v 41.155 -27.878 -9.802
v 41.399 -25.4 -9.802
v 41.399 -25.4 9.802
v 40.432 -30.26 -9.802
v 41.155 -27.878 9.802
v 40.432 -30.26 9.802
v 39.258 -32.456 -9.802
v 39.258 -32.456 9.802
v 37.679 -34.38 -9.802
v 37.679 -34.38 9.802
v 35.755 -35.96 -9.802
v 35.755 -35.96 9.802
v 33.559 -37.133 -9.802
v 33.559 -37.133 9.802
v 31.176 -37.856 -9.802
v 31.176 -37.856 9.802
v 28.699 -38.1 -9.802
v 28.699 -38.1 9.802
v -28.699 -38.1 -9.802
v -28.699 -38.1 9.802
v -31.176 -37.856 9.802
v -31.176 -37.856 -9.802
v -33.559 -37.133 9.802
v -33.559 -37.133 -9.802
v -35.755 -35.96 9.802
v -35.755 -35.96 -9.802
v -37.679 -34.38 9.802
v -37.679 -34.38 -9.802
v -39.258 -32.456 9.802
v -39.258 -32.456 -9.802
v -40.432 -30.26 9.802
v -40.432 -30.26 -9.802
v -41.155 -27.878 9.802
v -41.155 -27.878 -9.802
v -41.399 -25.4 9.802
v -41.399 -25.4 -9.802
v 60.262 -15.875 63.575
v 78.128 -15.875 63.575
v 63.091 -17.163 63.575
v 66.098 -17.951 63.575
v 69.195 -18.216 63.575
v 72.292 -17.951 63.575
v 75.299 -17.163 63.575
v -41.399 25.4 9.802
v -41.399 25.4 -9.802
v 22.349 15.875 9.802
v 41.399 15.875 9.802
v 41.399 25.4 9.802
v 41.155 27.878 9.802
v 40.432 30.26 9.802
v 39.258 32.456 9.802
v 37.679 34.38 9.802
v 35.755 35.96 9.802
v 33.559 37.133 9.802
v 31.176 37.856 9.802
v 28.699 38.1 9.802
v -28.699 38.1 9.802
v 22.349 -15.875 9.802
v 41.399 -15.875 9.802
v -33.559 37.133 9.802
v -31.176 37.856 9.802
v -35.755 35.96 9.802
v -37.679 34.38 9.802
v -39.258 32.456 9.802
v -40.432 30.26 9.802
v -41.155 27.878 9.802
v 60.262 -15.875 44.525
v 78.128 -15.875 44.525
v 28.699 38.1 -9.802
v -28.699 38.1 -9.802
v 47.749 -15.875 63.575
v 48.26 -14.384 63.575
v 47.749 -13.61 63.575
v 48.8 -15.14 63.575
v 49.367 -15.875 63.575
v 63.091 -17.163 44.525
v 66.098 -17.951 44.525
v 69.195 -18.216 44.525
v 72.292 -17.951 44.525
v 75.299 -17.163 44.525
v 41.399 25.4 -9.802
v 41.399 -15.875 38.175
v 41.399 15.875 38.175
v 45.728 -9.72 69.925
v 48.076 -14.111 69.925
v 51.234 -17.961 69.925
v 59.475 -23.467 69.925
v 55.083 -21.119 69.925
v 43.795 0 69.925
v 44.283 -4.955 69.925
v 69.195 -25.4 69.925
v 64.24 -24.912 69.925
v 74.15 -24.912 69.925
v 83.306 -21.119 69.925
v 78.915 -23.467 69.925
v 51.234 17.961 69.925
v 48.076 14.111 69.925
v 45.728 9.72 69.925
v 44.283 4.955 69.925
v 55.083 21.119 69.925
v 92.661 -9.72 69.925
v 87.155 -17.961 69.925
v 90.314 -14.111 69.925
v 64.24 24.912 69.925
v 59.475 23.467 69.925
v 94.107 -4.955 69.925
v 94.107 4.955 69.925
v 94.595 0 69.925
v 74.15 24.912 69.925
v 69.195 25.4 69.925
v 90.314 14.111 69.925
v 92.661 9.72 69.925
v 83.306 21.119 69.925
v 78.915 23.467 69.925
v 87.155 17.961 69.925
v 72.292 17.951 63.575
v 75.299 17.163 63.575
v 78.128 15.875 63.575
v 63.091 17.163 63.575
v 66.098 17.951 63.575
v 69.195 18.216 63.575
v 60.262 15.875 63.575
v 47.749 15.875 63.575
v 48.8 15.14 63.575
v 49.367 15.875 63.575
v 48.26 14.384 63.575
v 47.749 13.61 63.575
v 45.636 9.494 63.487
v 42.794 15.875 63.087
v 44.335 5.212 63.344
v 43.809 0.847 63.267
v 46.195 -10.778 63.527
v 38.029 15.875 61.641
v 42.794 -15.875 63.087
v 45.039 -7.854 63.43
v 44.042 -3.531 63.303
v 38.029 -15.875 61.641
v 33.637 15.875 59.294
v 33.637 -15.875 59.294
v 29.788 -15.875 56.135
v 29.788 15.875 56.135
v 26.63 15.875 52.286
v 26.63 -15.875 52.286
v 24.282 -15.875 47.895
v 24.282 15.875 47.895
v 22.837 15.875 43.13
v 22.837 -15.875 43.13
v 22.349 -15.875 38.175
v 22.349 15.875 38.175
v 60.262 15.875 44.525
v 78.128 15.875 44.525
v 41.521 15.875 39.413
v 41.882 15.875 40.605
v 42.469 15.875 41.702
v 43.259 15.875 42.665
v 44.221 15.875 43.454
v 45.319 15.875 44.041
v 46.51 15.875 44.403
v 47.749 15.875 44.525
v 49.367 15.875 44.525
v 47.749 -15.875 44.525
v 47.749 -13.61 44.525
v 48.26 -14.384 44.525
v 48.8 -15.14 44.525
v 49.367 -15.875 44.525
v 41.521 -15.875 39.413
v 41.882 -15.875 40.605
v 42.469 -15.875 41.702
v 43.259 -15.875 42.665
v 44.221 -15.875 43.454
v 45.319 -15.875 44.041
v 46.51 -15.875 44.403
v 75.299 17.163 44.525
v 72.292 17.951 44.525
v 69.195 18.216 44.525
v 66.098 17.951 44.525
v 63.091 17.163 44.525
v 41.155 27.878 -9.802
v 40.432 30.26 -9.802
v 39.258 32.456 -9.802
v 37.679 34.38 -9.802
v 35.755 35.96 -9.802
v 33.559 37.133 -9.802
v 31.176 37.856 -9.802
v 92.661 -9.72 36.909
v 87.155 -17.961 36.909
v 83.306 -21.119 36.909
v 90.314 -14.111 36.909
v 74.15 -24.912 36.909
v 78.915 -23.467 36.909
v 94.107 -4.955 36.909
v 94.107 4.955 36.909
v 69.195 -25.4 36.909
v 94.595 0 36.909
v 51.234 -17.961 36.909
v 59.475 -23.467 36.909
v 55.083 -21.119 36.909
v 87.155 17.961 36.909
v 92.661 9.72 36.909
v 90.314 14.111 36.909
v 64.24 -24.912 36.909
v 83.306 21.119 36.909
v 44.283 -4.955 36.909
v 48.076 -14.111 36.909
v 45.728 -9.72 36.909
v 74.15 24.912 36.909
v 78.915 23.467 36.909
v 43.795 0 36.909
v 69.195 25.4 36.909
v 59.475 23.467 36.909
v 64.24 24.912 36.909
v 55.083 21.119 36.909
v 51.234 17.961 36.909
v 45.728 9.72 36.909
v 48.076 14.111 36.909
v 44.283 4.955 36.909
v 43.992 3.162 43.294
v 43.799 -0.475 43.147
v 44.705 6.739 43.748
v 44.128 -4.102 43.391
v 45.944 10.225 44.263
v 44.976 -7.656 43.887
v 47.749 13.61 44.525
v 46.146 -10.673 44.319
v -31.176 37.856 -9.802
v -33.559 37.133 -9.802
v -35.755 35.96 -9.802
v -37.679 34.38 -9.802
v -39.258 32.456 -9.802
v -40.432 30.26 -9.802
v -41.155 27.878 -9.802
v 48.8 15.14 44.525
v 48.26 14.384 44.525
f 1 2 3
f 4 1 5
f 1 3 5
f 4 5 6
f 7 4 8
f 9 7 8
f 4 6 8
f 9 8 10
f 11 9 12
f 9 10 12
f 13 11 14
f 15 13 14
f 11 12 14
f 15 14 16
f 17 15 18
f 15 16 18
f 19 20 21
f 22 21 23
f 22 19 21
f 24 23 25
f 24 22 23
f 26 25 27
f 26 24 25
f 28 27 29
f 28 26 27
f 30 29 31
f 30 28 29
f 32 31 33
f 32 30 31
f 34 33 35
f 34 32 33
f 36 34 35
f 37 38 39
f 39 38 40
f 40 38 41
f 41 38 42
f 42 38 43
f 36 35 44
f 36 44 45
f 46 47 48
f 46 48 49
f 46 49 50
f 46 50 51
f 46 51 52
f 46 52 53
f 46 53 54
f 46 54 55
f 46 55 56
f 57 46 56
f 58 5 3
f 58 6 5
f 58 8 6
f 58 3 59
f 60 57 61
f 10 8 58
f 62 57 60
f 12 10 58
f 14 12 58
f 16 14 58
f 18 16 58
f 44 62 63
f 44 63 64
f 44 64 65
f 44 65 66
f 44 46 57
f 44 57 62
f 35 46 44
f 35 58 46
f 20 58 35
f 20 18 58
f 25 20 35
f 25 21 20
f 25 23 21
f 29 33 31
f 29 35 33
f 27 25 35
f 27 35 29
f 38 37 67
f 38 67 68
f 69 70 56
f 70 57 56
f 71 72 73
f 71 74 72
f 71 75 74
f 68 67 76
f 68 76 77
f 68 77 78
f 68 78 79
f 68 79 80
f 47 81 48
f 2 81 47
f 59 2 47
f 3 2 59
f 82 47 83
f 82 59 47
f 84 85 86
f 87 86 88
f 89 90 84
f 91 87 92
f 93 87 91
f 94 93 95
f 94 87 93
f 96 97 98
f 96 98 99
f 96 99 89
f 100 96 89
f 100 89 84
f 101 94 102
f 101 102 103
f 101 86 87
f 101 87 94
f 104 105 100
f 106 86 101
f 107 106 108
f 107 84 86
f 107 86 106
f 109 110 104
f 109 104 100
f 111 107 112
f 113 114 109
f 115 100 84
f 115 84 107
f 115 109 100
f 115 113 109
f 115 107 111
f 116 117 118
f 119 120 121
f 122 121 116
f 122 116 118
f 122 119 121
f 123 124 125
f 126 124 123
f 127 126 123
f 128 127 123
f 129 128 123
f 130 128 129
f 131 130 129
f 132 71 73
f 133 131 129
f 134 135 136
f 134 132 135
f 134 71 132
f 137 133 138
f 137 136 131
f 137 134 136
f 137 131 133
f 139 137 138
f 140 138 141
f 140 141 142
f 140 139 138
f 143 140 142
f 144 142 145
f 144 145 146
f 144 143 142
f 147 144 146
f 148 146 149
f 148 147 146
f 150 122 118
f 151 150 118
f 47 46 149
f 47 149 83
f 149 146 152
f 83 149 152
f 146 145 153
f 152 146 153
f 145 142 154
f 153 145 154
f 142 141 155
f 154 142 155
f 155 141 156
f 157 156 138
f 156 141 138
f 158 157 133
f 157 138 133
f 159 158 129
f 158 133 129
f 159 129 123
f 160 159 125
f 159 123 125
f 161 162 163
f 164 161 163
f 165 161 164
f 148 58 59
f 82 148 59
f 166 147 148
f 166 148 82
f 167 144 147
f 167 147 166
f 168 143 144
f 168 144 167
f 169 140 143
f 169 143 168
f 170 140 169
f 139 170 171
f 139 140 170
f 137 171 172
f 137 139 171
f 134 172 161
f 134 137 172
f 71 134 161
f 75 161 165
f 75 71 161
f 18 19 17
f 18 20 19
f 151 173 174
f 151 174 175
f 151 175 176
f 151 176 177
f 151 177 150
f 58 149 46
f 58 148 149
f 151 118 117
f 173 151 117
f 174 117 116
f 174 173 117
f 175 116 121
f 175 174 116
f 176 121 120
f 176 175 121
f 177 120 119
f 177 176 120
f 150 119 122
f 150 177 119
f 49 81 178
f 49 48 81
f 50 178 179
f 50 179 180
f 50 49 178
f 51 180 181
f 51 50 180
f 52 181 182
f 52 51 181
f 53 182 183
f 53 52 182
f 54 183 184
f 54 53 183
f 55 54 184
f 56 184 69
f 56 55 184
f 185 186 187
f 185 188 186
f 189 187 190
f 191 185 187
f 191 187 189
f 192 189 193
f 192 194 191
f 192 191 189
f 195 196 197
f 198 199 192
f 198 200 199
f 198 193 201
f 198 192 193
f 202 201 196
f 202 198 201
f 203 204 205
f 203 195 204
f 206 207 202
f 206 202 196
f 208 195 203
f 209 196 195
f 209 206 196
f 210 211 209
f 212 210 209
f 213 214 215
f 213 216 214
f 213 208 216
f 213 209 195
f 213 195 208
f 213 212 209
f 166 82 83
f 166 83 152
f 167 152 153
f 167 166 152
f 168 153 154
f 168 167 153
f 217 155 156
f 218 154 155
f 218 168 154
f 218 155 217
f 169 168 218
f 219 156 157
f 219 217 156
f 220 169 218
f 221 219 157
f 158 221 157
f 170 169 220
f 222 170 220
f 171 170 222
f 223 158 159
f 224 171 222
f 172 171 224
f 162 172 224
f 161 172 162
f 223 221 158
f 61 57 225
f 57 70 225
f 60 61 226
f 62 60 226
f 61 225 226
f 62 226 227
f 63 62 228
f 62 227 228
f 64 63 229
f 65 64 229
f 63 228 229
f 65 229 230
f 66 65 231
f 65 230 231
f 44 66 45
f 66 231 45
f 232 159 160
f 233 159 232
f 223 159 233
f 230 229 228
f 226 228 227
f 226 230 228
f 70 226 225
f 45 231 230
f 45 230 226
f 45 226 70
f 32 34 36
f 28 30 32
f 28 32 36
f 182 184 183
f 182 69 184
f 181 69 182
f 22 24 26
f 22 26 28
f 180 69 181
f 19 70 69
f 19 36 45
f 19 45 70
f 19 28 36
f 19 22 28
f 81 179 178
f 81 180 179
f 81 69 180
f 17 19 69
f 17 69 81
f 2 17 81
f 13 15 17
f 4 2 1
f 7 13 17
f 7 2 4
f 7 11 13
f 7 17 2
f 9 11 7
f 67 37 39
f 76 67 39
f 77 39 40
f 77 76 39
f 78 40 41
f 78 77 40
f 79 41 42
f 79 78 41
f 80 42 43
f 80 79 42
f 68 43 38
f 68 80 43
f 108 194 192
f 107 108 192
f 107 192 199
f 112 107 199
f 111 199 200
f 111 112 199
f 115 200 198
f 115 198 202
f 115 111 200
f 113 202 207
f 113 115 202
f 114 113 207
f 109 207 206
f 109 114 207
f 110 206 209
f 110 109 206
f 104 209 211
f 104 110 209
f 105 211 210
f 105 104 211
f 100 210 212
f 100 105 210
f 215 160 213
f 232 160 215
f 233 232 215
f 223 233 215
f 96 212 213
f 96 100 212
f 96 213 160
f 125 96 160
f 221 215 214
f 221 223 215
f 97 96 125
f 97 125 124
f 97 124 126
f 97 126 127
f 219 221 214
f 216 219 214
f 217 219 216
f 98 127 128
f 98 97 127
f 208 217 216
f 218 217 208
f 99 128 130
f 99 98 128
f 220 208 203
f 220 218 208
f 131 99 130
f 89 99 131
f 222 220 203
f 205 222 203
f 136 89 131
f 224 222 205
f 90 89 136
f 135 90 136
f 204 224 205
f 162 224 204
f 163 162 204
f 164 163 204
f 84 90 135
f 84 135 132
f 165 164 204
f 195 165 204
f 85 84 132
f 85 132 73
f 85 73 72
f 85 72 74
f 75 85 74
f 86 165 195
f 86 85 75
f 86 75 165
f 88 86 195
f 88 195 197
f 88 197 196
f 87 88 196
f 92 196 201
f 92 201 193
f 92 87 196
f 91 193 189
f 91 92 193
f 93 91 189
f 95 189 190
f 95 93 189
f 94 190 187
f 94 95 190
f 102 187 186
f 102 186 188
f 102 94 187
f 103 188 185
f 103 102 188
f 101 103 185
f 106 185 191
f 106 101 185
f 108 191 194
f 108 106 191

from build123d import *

# Parameters (mm, degrees)
F1_DEPTH = 38.1
F0_W     = 18.215902
F0_H     = 19.05
F2_DEPTH = 15.875
F4_R     = 12.7


with BuildPart() as f1:
    # F0 (on Front) → F1 (new body, symmetric)
    with BuildSketch(Plane.XZ):
        Polygon((-41.398831, -9.801595), (41.398831, -9.801595), (41.398831, 9.801595), (22.34883, 9.801595), (-41.398831, 9.801595), align=None)
    extrude(amount=F1_DEPTH, both=True)

    # F0 (on Front) → F2 (join, symmetric)
    with BuildSketch(Plane.XZ):
        with BuildLine():
            Line((22.34883, 9.801595), (41.398831, 9.801595))
            Line((41.398831, 9.801595), (41.398831, 38.174614))
            ThreePointArc((41.398831, 38.174614), (43.258703, 42.664742), (47.74883, 44.524614))
            Line((47.74883, 44.524614), (69.194875, 44.524614))
            Line((69.194875, 44.524614), (69.194875, 63.574614))
            Line((69.194875, 63.574614), (47.74883, 63.574614))
            ThreePointArc((47.74883, 63.574614), (29.788318, 56.135127), (22.34883, 38.174614))
            Line((22.34883, 38.174614), (22.34883, 9.801595))
        make_face()
        with Locations((78.302826, 54.049614)):
            Rectangle(F0_W, F0_H)
    extrude(amount=F2_DEPTH, both=True)

    # F0 (on Front) → F3 (revolve)
    with BuildSketch(Plane.XZ):
        Polygon((87.410777, 44.524614), (69.194875, 44.524614), (69.194875, 36.908722), (94.594875, 36.908722), (94.594875, 69.924614), (69.194875, 69.924614), (69.194875, 63.574614), (87.410777, 63.574614), align=None)
    revolve(axis=Axis((69.194875, 0, 53.416668), (0, 0, 1)))

    # F4
    f4_edges = [f1.edges().sort_by_distance(p)[0] for p in [
        (-41.398831, -38.1, 0),
        (41.398831, -38.1, 0),
        (-41.398831, 38.1, 0),
        (41.398831, 38.1, 0),
    ]]
    fillet(f4_edges, radius=F4_R)


solid = f1.part
